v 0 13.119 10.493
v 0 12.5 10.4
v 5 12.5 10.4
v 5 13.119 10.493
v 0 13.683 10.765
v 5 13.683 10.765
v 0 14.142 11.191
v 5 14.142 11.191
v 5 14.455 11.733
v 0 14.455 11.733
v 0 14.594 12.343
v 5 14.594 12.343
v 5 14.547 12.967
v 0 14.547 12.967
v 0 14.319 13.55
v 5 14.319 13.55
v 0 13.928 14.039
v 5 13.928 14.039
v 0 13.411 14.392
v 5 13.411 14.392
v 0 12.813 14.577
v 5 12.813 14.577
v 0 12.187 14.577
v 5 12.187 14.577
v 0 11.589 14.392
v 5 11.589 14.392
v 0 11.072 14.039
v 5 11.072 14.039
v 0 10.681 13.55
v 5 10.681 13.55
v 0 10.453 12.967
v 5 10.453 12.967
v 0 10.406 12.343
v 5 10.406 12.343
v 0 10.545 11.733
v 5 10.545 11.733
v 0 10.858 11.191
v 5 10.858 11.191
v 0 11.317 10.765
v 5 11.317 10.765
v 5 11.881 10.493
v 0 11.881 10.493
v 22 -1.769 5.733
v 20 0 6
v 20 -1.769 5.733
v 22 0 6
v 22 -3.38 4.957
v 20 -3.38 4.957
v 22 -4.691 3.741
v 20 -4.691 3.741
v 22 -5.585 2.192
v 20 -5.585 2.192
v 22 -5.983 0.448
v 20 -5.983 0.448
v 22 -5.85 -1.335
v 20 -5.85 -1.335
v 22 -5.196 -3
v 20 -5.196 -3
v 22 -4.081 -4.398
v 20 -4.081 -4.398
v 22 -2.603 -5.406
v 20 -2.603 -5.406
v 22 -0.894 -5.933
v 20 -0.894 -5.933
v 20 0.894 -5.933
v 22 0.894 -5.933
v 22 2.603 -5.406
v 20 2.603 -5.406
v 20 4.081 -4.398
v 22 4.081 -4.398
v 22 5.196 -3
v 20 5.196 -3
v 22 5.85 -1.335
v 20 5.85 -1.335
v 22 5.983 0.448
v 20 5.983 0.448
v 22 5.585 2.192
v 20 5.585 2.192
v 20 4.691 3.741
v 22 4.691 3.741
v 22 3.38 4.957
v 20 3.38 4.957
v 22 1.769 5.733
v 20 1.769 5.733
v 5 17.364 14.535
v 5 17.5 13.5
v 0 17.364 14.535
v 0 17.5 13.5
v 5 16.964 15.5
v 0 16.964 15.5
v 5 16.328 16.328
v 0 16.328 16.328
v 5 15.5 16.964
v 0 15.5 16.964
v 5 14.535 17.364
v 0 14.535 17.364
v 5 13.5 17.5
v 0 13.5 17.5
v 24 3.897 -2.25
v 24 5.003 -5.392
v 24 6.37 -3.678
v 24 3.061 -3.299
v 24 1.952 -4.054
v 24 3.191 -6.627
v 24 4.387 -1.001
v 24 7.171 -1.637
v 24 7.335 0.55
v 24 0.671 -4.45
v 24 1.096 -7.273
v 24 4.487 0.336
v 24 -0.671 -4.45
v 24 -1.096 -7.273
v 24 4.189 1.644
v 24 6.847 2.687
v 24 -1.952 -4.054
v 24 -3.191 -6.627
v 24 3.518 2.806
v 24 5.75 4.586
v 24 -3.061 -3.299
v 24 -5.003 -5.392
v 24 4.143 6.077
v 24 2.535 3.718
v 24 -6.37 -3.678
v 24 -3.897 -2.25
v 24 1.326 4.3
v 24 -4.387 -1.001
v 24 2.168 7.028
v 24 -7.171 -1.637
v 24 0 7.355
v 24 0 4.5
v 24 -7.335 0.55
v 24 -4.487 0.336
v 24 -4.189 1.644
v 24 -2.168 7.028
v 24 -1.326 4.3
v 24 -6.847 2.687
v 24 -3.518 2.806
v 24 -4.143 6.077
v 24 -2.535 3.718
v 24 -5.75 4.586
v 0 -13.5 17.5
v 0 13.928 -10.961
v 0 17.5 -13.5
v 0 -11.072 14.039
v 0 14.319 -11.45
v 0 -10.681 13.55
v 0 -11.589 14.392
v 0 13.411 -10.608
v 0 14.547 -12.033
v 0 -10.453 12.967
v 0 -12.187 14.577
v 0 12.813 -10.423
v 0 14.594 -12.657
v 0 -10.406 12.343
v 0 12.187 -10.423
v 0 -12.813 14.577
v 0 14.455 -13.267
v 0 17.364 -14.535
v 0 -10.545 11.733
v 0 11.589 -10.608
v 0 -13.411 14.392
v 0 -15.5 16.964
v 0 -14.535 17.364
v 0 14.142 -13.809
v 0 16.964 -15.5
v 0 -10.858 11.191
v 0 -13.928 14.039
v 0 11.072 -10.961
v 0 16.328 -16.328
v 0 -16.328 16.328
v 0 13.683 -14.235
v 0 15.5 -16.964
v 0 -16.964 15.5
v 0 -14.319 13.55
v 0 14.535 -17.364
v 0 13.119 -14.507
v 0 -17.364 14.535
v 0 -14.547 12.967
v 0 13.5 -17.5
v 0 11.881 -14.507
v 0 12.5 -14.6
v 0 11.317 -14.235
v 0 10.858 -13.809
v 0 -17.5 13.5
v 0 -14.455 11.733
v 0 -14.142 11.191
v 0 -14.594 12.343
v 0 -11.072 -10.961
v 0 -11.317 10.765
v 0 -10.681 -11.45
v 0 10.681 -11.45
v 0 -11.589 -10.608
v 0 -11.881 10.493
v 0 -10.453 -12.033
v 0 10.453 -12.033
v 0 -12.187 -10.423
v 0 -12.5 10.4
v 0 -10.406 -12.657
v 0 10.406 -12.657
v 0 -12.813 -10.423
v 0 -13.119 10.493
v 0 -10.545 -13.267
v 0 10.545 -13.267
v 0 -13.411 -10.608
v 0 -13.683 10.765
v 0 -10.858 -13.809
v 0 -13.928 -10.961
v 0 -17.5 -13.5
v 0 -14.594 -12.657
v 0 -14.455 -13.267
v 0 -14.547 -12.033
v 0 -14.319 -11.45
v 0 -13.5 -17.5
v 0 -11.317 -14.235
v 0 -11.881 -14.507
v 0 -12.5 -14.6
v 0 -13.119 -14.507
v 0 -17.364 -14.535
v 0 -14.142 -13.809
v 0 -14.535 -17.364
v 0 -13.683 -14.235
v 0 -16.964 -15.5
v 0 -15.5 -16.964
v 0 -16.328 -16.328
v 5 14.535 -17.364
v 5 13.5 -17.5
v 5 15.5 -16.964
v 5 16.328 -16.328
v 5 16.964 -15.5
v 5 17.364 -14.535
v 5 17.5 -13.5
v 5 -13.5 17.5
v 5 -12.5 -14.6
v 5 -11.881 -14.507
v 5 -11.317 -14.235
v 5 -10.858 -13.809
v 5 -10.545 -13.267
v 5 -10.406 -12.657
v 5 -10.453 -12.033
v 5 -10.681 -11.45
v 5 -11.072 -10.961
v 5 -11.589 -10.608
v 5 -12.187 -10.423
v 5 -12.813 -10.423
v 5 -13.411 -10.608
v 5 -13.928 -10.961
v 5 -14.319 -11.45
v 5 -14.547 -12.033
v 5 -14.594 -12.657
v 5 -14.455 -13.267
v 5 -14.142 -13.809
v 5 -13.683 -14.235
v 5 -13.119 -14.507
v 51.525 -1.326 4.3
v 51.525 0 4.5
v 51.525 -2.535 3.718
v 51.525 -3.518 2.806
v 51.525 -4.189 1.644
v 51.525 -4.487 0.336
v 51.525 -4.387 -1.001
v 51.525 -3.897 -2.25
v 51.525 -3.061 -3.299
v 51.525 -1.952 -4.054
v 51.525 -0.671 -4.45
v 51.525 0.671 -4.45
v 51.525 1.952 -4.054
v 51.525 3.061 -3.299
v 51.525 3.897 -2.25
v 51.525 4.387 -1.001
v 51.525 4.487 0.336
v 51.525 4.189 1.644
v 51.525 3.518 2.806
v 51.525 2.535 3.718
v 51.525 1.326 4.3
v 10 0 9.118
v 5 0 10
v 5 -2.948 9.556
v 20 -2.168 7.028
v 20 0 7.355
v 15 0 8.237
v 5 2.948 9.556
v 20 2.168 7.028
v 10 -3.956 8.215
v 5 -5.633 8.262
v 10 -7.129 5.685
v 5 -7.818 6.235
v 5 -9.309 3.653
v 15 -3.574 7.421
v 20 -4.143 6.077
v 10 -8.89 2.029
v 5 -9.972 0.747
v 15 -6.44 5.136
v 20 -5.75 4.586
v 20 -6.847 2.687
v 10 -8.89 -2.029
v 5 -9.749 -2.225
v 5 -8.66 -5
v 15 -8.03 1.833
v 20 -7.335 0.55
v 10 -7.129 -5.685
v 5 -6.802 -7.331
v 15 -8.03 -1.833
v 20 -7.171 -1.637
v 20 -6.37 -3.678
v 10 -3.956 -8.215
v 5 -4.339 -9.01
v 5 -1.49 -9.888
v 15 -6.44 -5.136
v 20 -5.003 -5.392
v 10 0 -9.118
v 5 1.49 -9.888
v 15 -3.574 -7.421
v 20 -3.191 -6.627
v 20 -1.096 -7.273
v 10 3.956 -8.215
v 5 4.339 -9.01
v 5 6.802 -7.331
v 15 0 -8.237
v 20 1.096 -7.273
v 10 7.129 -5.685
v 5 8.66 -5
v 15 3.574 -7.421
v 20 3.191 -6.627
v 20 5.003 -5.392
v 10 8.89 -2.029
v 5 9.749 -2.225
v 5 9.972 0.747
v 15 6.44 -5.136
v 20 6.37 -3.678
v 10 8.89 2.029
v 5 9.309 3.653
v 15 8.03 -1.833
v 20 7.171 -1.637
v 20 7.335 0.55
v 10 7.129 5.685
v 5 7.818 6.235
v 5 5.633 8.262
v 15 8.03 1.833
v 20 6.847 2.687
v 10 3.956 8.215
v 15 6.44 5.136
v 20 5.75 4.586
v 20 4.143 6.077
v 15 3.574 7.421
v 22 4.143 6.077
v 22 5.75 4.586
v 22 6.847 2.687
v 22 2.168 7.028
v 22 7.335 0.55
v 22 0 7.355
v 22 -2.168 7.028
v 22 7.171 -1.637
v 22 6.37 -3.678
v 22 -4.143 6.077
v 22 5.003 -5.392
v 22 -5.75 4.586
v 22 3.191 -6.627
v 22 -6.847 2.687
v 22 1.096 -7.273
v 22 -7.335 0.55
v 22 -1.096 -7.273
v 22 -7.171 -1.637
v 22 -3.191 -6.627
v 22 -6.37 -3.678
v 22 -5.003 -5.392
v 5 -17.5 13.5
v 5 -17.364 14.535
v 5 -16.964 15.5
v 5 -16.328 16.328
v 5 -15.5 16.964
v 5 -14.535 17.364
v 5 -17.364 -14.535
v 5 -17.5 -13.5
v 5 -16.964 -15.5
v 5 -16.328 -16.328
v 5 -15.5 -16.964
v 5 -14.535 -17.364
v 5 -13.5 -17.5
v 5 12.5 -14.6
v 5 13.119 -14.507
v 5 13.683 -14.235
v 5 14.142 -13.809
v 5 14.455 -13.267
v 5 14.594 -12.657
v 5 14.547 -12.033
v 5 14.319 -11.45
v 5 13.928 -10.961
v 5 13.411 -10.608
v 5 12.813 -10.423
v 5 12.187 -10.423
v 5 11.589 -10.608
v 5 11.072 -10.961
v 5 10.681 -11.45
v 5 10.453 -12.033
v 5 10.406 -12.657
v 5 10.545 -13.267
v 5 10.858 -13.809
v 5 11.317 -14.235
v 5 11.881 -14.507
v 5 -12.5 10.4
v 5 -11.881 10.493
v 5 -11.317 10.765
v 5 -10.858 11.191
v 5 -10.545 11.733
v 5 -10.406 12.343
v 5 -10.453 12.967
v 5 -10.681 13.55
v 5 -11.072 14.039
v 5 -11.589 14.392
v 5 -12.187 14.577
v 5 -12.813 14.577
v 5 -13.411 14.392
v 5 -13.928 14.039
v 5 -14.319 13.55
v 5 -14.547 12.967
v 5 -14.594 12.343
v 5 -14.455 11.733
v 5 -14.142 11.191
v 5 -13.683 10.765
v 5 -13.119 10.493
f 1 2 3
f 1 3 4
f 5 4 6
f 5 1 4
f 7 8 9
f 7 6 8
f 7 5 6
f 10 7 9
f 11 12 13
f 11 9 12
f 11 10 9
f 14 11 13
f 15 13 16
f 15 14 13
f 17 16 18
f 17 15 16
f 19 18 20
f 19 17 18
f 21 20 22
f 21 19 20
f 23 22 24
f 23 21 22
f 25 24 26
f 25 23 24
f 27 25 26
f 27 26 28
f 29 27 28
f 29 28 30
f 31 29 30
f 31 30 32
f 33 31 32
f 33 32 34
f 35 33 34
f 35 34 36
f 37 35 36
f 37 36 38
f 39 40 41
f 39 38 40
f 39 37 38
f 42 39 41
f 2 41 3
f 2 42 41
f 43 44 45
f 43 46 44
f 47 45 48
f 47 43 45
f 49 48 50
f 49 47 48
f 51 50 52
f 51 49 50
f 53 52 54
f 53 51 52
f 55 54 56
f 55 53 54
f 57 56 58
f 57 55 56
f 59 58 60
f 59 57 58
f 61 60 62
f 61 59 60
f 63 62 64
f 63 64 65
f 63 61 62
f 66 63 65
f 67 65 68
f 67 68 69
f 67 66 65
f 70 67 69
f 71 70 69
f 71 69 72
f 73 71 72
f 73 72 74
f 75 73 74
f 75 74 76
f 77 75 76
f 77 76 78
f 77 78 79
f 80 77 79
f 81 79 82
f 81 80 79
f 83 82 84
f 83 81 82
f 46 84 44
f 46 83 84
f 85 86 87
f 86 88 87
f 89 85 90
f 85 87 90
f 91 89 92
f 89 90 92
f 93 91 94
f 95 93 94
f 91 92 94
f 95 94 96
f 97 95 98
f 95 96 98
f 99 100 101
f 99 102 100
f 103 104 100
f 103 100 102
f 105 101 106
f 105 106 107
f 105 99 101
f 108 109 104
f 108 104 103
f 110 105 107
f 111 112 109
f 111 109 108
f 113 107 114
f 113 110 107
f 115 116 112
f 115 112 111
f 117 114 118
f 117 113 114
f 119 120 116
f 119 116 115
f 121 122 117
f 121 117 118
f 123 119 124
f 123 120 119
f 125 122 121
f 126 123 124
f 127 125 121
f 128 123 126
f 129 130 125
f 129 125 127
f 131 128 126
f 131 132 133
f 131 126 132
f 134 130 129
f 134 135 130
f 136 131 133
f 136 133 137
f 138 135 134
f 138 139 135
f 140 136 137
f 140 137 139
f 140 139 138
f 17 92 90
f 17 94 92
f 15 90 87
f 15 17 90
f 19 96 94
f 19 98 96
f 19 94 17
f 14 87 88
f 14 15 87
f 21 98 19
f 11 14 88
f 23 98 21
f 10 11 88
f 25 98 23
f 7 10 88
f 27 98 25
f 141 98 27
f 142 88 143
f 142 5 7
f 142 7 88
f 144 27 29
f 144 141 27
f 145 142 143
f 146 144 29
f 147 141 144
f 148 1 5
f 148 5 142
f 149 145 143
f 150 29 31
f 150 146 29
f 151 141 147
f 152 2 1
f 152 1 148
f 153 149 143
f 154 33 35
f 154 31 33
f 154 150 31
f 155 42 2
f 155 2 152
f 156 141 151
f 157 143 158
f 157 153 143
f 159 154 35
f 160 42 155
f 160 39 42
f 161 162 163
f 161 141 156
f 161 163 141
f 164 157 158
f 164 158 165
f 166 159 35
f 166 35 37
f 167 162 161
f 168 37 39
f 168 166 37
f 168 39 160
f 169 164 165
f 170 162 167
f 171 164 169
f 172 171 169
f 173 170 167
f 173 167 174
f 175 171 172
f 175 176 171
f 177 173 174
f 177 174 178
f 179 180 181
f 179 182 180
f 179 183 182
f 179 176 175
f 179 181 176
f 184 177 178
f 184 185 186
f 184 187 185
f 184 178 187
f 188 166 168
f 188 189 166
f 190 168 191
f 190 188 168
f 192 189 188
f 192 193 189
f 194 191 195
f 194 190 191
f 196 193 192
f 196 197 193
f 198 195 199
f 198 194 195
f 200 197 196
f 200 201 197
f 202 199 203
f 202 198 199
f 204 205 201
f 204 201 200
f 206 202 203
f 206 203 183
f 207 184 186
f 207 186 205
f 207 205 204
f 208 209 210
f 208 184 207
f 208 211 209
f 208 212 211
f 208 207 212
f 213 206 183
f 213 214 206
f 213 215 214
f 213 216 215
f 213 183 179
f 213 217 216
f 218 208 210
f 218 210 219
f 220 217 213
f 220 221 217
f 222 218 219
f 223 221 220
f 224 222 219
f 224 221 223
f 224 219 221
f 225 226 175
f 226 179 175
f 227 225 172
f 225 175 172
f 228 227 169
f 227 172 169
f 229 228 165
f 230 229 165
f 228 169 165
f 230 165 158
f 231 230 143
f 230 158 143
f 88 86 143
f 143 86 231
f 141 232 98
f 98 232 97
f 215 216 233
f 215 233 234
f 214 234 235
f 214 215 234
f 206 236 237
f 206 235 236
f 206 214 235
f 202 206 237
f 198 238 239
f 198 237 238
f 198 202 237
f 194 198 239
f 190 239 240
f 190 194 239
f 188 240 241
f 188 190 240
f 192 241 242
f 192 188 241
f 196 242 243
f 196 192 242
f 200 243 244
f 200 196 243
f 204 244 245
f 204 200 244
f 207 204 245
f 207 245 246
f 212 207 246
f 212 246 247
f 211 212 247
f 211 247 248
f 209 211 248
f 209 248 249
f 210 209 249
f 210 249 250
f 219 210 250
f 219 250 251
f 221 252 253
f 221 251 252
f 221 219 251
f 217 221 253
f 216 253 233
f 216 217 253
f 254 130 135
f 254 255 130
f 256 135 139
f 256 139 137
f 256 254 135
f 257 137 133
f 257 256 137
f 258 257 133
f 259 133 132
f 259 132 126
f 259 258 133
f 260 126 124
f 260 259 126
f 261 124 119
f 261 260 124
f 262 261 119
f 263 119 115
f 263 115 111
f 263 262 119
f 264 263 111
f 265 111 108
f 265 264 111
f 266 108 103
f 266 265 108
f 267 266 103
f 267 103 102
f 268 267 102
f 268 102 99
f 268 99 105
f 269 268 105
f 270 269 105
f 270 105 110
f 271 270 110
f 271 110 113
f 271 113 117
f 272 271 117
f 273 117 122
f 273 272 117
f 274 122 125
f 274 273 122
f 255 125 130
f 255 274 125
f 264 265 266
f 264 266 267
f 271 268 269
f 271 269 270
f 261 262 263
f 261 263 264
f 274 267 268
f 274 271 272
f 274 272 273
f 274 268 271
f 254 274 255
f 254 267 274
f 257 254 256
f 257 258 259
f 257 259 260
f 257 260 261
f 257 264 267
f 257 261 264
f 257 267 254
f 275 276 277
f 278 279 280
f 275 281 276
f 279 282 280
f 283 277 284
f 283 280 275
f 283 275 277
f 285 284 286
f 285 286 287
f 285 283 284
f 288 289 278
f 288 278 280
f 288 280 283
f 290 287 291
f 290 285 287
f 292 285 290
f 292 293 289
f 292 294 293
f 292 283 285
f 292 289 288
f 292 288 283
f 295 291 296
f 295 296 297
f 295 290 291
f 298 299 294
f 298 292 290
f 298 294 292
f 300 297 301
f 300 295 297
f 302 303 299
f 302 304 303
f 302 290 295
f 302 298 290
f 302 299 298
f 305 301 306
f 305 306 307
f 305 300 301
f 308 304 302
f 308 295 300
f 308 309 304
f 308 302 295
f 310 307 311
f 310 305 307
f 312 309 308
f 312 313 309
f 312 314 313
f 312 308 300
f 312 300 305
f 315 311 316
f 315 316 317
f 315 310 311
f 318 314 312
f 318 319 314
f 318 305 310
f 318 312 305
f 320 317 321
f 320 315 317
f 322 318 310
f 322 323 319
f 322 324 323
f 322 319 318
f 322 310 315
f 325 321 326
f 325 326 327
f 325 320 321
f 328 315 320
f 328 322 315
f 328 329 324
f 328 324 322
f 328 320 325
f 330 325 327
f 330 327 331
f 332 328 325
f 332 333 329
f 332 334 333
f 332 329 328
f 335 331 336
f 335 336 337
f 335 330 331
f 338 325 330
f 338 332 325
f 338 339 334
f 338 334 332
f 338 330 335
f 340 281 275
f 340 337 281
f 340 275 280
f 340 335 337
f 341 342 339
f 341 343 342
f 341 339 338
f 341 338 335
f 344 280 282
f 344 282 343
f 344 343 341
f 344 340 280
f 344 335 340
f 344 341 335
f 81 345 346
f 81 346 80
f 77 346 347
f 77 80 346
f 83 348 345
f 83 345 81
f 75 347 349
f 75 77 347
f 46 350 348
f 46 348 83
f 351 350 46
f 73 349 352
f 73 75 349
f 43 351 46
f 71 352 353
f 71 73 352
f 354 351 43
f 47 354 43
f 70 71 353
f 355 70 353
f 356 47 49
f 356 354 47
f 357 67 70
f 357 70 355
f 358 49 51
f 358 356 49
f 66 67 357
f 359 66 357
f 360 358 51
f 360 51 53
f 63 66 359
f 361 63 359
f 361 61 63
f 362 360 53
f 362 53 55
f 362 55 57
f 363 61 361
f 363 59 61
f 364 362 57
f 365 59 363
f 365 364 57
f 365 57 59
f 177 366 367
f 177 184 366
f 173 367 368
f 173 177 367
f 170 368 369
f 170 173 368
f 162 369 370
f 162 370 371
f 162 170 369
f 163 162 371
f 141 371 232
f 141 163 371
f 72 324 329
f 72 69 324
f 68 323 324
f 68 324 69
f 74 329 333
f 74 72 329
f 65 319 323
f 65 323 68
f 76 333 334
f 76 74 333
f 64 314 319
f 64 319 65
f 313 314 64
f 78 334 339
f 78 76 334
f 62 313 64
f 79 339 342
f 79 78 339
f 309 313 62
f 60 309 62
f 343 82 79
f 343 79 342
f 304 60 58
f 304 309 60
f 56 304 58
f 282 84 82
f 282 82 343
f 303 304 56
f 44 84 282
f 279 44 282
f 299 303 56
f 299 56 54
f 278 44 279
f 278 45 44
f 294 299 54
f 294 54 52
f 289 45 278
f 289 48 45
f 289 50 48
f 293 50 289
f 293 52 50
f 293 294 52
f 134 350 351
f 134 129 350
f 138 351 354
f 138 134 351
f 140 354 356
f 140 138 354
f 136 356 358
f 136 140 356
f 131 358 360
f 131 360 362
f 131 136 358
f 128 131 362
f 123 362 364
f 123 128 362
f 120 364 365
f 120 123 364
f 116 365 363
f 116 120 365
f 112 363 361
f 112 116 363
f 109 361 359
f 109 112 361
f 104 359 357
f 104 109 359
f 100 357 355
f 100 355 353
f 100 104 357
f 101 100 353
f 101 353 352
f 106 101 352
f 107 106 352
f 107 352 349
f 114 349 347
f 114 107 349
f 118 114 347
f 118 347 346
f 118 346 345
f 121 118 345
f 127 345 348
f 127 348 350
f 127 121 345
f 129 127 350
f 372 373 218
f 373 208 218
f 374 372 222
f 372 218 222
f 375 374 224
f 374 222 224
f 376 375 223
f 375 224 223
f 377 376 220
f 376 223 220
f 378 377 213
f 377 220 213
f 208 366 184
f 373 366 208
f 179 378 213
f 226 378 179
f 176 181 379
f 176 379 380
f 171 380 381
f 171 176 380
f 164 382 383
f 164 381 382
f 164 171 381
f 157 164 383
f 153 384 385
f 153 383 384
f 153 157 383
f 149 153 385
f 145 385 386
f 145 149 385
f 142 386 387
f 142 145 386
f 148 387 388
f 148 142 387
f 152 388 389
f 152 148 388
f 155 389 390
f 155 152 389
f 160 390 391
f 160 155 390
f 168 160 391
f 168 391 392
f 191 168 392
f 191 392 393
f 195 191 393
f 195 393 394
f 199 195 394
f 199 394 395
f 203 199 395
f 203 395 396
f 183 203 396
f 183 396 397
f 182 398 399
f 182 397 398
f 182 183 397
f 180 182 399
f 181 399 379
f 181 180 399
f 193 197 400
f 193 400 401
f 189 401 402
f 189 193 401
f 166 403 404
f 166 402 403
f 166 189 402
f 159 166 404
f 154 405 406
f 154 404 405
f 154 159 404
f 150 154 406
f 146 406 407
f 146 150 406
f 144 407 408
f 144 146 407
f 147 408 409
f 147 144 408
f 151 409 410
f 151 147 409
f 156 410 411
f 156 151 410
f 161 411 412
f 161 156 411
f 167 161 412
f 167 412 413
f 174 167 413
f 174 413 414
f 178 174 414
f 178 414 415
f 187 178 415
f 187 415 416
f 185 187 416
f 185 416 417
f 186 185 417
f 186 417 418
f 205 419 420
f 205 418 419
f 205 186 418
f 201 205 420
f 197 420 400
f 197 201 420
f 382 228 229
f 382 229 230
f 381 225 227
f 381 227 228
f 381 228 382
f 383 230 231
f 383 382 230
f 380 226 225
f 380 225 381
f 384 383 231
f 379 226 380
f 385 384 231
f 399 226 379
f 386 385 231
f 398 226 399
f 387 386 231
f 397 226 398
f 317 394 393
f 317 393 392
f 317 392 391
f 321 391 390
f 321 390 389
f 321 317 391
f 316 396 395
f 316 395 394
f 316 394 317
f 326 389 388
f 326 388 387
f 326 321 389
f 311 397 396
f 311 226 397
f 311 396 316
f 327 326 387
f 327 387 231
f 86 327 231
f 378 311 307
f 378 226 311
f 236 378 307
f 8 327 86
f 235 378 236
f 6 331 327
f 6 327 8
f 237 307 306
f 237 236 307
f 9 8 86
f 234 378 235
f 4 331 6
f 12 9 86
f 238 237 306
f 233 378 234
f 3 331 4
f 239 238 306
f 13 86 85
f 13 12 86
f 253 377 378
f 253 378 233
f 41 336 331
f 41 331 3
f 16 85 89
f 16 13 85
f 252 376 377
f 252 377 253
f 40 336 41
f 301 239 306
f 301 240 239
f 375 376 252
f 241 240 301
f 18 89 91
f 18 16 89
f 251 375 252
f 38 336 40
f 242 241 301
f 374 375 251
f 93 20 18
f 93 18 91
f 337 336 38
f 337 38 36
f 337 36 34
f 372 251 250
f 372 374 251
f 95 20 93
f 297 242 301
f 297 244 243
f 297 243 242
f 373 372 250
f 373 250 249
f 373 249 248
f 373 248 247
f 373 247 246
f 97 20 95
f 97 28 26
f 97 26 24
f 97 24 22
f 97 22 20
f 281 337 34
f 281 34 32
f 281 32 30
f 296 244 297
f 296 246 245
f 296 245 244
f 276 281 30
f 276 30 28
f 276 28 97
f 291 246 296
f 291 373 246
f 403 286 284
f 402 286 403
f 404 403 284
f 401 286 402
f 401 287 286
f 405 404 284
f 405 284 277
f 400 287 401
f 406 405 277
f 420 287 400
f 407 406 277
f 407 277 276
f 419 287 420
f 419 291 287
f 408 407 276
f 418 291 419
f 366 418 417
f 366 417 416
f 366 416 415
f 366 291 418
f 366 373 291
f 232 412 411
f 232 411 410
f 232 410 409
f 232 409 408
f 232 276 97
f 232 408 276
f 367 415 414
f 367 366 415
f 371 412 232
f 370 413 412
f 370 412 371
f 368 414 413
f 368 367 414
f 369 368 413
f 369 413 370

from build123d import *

# Parameters (mm, degrees)
SKETCH4_OUTSIDE_W       = 94.32
SKETCH4_OUTSIDE_H       = 94.32
SKETCH4_OUTSIDE_W_2     = 35
SKETCH4_OUTSIDE_H_2     = 35
CUT_EXTRUDE1_DEPTH      = 5
FILLET1_R               = 4
CUT_EXTRUDE2_DEPTH      = 53.697949186
CUT_EXTRUDE2_DEPTH_BACK = 53.697949186
SKETCH5_R               = 2.1


with BuildPart() as part:
    # Sketch3 → Revolve1 (revolve)
    with BuildSketch(Plane(origin=(0, 0, 0), x_dir=(1, 0, 0), z_dir=(0, 1, 0))):
        Polygon((0, 0), (0, 35), (5, 35), (5, 10), (20, 7.355095289), (20, 6), (22, 6), (22, 7.355095289), (24, 7.355095289), (24, 4.5), (51.524980907, 4.5), (51.524980907, 0), align=None)
    revolve(axis=Axis((0, 0, 0), (1, 0, 0)))

    # Sketch4 outside → Cut-Extrude1 (cut)
    with BuildSketch(Plane(origin=(5, 0, 0), x_dir=(0, 0, -1), z_dir=(1, 0, 0))):
        Rectangle(SKETCH4_OUTSIDE_W, SKETCH4_OUTSIDE_H)
        Rectangle(SKETCH4_OUTSIDE_W_2, SKETCH4_OUTSIDE_H_2, mode=Mode.SUBTRACT)
    extrude(amount=-CUT_EXTRUDE1_DEPTH, mode=Mode.SUBTRACT)

    # Fillet1
    fillet1_edges = [part.edges().sort_by_distance(p)[0] for p in [
        (2.5, 17.5, -17.5),
        (2.5, -17.5, -17.5),
        (2.5, -17.5, 17.5),
        (2.5, 17.5, 17.5),
    ]]
    fillet(fillet1_edges, radius=FILLET1_R)

    # Sketch5 → Cut-Extrude2 (cut, two sides: drawn at the far end of the back side and taken through both)
    with BuildSketch(Plane(origin=(5, 0, 0), x_dir=(0, 0, -1), z_dir=(1, 0, 0)).offset(-CUT_EXTRUDE2_DEPTH_BACK)):
        with Locations((-12.5, 12.5)):
            Circle(SKETCH5_R)
        with Locations((12.5, 12.5)):
            Circle(SKETCH5_R)
        with Locations((12.5, -12.5)):
            Circle(SKETCH5_R)
        with Locations((-12.5, -12.5)):
            Circle(SKETCH5_R)
    extrude(amount=CUT_EXTRUDE2_DEPTH + CUT_EXTRUDE2_DEPTH_BACK, mode=Mode.SUBTRACT)


solid = part.part
